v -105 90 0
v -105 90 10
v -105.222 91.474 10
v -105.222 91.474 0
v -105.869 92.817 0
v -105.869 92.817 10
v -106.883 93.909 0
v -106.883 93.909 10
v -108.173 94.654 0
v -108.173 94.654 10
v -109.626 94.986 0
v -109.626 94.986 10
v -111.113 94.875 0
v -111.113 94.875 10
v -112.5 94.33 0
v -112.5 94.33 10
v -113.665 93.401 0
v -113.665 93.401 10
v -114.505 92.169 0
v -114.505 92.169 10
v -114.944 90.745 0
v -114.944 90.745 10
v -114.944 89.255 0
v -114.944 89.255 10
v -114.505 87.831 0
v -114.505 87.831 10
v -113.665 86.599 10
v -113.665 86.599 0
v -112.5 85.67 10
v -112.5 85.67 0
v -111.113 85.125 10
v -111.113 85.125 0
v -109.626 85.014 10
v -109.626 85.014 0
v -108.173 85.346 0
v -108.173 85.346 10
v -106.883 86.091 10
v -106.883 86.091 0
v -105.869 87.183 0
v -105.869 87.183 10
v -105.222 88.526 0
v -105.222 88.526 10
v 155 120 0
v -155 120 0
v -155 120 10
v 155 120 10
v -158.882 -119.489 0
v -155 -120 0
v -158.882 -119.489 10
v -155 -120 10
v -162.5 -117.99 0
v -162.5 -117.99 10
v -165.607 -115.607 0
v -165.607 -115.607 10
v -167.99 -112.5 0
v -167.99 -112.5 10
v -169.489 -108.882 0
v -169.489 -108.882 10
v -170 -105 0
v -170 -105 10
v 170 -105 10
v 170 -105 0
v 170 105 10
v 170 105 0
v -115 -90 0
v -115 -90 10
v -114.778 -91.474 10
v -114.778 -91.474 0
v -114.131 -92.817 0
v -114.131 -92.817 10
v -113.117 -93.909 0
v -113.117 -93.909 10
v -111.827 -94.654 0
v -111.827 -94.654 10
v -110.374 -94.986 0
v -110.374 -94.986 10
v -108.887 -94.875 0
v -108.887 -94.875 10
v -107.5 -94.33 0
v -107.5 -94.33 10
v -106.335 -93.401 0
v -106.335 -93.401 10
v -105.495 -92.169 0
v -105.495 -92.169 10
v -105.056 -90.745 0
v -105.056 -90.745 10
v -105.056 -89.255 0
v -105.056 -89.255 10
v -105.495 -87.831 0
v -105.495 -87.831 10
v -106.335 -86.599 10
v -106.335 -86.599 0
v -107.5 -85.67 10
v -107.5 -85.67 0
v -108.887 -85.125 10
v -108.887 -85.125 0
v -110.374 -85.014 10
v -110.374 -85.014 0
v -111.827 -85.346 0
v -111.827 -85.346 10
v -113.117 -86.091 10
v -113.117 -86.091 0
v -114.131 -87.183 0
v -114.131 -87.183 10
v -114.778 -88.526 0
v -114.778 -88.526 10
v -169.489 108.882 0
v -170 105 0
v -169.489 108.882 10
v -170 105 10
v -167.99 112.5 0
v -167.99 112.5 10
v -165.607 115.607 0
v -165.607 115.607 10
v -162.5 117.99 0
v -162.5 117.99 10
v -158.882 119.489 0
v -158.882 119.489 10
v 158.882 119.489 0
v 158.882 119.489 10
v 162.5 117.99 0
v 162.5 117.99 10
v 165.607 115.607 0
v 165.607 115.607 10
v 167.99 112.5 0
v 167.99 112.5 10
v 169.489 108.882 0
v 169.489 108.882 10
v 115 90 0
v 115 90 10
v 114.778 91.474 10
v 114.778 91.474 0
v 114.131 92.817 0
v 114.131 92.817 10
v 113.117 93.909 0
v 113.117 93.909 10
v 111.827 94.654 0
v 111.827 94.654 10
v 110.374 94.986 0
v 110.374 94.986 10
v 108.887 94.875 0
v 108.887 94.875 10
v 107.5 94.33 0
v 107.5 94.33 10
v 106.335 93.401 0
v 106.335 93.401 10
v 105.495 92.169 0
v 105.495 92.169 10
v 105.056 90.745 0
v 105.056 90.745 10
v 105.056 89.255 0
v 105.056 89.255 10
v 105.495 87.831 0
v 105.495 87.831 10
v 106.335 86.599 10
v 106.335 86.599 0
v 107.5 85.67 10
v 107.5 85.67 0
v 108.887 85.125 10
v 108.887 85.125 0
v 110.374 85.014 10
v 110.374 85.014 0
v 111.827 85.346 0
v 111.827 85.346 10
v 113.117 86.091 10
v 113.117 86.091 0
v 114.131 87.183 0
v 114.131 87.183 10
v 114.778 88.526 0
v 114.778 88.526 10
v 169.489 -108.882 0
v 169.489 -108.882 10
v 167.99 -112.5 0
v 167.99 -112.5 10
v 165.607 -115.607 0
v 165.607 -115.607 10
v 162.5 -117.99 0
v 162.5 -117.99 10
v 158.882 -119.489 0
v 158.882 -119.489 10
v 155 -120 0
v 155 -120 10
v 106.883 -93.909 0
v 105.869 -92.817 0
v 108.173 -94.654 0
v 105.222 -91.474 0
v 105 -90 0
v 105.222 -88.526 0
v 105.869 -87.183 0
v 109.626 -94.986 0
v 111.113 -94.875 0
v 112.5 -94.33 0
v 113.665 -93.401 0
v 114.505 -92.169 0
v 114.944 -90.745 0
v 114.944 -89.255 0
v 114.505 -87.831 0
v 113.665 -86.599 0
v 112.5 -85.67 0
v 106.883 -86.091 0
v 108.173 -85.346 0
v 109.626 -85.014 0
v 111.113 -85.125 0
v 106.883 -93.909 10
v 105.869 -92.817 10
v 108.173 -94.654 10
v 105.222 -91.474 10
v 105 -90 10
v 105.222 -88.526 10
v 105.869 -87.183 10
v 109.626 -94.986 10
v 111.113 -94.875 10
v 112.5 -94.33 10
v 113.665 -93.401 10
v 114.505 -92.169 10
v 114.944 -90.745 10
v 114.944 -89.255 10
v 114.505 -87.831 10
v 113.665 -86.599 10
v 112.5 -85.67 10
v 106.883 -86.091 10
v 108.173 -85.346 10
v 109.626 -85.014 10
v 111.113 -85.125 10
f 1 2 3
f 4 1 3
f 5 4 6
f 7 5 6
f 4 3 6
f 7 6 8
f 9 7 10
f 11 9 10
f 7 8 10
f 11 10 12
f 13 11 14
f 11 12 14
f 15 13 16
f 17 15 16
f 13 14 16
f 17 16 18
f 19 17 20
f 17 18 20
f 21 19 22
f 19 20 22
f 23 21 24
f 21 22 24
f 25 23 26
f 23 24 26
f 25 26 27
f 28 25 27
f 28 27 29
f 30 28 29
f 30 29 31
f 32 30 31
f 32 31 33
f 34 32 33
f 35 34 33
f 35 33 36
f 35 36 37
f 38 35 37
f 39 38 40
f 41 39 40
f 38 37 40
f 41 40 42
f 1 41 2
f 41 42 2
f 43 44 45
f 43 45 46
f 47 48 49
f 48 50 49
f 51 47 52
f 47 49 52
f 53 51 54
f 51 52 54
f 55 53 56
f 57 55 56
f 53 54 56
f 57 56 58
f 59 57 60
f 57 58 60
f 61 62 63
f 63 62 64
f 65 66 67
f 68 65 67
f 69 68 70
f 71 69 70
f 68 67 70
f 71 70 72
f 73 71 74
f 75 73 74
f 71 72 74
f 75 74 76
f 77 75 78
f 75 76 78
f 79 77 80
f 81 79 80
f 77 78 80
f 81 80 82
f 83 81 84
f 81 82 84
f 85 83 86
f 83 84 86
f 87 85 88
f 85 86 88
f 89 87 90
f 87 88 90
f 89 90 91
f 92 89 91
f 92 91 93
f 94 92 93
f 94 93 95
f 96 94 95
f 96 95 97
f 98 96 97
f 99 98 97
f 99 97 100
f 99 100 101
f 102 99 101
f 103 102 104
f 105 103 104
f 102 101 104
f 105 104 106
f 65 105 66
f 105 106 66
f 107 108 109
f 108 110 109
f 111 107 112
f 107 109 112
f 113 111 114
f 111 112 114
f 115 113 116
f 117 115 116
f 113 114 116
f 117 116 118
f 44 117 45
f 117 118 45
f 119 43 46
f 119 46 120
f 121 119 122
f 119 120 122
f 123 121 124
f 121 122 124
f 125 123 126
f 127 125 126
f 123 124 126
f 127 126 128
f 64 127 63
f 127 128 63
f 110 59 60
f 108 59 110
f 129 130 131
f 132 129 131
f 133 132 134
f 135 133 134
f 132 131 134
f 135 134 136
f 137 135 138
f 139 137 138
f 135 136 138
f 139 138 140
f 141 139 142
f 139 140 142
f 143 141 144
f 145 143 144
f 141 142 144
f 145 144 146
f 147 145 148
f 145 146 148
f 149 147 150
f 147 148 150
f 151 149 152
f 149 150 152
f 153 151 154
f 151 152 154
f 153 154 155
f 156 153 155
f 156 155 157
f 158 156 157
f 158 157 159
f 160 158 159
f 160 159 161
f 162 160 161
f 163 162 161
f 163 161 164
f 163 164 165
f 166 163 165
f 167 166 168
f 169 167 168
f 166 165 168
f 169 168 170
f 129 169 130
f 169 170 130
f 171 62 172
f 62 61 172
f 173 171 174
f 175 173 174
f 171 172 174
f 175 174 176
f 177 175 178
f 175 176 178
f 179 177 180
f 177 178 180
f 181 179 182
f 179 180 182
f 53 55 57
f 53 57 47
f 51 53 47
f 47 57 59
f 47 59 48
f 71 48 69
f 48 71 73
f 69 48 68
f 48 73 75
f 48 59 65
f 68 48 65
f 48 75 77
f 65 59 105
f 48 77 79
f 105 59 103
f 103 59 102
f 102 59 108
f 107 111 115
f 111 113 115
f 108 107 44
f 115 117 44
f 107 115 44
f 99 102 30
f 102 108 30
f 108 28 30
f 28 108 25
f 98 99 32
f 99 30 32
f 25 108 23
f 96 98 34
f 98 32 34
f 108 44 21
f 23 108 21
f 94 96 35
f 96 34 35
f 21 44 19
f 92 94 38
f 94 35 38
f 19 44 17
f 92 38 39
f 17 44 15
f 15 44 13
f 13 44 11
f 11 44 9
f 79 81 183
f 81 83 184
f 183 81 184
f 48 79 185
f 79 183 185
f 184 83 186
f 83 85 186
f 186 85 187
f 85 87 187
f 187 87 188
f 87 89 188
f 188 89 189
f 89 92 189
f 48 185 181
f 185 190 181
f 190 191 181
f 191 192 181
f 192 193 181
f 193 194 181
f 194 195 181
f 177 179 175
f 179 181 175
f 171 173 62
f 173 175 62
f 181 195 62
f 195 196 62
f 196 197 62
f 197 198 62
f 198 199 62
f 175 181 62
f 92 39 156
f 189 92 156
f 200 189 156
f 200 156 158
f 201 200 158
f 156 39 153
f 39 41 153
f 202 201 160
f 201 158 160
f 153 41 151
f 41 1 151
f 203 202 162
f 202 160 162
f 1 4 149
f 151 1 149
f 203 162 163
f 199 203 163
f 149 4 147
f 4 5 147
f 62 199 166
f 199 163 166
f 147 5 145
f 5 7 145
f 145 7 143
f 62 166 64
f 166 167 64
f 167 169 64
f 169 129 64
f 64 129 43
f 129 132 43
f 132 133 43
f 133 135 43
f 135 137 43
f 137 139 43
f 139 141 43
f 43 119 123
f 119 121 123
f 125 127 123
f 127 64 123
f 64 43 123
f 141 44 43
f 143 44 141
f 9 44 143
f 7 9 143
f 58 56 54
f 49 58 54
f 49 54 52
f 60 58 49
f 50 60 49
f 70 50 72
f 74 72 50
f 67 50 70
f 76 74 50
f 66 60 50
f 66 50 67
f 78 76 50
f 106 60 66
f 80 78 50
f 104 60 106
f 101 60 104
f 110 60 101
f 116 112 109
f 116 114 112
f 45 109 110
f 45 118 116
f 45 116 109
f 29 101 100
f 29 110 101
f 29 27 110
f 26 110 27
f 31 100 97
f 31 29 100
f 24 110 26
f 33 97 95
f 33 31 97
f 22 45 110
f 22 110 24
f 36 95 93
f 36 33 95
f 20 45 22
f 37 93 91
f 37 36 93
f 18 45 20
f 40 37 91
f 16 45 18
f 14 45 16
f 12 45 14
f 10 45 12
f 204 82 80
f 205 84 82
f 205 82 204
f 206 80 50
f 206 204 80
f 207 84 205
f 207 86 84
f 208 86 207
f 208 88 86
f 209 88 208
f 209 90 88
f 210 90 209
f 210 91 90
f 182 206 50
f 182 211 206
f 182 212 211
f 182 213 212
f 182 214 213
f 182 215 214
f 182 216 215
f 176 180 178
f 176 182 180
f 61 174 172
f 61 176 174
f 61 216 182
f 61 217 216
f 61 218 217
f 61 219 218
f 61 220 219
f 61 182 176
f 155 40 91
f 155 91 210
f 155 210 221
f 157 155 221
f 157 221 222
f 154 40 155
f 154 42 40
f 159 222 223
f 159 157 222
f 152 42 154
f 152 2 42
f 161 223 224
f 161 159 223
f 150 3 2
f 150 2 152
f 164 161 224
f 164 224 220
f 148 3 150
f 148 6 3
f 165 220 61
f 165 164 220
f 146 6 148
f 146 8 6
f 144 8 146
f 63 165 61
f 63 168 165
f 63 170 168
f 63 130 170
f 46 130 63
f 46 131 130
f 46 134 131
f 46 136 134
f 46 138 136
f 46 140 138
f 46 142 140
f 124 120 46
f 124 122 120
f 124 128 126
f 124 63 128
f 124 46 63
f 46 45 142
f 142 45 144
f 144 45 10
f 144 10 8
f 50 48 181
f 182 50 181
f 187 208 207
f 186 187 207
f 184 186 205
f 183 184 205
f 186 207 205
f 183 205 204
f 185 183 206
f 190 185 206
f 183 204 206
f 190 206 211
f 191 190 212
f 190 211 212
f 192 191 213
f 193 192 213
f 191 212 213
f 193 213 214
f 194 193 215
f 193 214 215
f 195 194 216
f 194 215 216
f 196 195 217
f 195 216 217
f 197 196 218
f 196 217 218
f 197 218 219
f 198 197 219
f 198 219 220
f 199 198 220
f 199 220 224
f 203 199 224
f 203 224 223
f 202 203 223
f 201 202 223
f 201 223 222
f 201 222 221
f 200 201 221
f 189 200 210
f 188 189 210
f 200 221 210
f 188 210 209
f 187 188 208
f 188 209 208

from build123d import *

# Parameters (mm, degrees)
SKETCH_1_W          = 340
SKETCH_1_H          = 240
EXTRUDE_1_DEPTH     = 10
FILLET_1_R          = 15
FILLET_2_R          = 15
FILLET_3_R          = 15
FILLET_4_R          = 15
SKETCH_2_R          = 5
CUT_EXTRUDE_1_DEPTH = 10


with BuildPart() as part:
    # 草图1 → 凸台-拉伸1 (new body)
    with BuildSketch(Plane.XY):
        Rectangle(SKETCH_1_W, SKETCH_1_H)
    extrude(amount=EXTRUDE_1_DEPTH)

    # 圆角1
    fillet_1_edges = [part.edges().sort_by_distance(p)[0] for p in [
        (-170, 120, 5),
    ]]
    fillet(fillet_1_edges, radius=FILLET_1_R)

    # 圆角2
    fillet_2_edges = [part.edges().sort_by_distance(p)[0] for p in [
        (170, 120, 5),
    ]]
    fillet(fillet_2_edges, radius=FILLET_2_R)

    # 圆角3
    fillet_3_edges = [part.edges().sort_by_distance(p)[0] for p in [
        (170, -120, 5),
    ]]
    fillet(fillet_3_edges, radius=FILLET_3_R)

    # 圆角4
    fillet_4_edges = [part.edges().sort_by_distance(p)[0] for p in [
        (-170, -120, 5),
    ]]
    fillet(fillet_4_edges, radius=FILLET_4_R)

    # 草图2 → 切除-拉伸1 (cut)
    with BuildSketch(Plane.XY.offset(10)):
        with Locations((110, 90)):
            Circle(SKETCH_2_R)
        with Locations((-110, 90)):
            Circle(SKETCH_2_R)
        with Locations(Location((110, -90, 0), (0, 0, 180))):
            Circle(SKETCH_2_R)
        with Locations(Location((-110, -90, 0), (0, 0, 180))):
            Circle(SKETCH_2_R)
    extrude(amount=-CUT_EXTRUDE_1_DEPTH, mode=Mode.SUBTRACT)


solid = part.part
